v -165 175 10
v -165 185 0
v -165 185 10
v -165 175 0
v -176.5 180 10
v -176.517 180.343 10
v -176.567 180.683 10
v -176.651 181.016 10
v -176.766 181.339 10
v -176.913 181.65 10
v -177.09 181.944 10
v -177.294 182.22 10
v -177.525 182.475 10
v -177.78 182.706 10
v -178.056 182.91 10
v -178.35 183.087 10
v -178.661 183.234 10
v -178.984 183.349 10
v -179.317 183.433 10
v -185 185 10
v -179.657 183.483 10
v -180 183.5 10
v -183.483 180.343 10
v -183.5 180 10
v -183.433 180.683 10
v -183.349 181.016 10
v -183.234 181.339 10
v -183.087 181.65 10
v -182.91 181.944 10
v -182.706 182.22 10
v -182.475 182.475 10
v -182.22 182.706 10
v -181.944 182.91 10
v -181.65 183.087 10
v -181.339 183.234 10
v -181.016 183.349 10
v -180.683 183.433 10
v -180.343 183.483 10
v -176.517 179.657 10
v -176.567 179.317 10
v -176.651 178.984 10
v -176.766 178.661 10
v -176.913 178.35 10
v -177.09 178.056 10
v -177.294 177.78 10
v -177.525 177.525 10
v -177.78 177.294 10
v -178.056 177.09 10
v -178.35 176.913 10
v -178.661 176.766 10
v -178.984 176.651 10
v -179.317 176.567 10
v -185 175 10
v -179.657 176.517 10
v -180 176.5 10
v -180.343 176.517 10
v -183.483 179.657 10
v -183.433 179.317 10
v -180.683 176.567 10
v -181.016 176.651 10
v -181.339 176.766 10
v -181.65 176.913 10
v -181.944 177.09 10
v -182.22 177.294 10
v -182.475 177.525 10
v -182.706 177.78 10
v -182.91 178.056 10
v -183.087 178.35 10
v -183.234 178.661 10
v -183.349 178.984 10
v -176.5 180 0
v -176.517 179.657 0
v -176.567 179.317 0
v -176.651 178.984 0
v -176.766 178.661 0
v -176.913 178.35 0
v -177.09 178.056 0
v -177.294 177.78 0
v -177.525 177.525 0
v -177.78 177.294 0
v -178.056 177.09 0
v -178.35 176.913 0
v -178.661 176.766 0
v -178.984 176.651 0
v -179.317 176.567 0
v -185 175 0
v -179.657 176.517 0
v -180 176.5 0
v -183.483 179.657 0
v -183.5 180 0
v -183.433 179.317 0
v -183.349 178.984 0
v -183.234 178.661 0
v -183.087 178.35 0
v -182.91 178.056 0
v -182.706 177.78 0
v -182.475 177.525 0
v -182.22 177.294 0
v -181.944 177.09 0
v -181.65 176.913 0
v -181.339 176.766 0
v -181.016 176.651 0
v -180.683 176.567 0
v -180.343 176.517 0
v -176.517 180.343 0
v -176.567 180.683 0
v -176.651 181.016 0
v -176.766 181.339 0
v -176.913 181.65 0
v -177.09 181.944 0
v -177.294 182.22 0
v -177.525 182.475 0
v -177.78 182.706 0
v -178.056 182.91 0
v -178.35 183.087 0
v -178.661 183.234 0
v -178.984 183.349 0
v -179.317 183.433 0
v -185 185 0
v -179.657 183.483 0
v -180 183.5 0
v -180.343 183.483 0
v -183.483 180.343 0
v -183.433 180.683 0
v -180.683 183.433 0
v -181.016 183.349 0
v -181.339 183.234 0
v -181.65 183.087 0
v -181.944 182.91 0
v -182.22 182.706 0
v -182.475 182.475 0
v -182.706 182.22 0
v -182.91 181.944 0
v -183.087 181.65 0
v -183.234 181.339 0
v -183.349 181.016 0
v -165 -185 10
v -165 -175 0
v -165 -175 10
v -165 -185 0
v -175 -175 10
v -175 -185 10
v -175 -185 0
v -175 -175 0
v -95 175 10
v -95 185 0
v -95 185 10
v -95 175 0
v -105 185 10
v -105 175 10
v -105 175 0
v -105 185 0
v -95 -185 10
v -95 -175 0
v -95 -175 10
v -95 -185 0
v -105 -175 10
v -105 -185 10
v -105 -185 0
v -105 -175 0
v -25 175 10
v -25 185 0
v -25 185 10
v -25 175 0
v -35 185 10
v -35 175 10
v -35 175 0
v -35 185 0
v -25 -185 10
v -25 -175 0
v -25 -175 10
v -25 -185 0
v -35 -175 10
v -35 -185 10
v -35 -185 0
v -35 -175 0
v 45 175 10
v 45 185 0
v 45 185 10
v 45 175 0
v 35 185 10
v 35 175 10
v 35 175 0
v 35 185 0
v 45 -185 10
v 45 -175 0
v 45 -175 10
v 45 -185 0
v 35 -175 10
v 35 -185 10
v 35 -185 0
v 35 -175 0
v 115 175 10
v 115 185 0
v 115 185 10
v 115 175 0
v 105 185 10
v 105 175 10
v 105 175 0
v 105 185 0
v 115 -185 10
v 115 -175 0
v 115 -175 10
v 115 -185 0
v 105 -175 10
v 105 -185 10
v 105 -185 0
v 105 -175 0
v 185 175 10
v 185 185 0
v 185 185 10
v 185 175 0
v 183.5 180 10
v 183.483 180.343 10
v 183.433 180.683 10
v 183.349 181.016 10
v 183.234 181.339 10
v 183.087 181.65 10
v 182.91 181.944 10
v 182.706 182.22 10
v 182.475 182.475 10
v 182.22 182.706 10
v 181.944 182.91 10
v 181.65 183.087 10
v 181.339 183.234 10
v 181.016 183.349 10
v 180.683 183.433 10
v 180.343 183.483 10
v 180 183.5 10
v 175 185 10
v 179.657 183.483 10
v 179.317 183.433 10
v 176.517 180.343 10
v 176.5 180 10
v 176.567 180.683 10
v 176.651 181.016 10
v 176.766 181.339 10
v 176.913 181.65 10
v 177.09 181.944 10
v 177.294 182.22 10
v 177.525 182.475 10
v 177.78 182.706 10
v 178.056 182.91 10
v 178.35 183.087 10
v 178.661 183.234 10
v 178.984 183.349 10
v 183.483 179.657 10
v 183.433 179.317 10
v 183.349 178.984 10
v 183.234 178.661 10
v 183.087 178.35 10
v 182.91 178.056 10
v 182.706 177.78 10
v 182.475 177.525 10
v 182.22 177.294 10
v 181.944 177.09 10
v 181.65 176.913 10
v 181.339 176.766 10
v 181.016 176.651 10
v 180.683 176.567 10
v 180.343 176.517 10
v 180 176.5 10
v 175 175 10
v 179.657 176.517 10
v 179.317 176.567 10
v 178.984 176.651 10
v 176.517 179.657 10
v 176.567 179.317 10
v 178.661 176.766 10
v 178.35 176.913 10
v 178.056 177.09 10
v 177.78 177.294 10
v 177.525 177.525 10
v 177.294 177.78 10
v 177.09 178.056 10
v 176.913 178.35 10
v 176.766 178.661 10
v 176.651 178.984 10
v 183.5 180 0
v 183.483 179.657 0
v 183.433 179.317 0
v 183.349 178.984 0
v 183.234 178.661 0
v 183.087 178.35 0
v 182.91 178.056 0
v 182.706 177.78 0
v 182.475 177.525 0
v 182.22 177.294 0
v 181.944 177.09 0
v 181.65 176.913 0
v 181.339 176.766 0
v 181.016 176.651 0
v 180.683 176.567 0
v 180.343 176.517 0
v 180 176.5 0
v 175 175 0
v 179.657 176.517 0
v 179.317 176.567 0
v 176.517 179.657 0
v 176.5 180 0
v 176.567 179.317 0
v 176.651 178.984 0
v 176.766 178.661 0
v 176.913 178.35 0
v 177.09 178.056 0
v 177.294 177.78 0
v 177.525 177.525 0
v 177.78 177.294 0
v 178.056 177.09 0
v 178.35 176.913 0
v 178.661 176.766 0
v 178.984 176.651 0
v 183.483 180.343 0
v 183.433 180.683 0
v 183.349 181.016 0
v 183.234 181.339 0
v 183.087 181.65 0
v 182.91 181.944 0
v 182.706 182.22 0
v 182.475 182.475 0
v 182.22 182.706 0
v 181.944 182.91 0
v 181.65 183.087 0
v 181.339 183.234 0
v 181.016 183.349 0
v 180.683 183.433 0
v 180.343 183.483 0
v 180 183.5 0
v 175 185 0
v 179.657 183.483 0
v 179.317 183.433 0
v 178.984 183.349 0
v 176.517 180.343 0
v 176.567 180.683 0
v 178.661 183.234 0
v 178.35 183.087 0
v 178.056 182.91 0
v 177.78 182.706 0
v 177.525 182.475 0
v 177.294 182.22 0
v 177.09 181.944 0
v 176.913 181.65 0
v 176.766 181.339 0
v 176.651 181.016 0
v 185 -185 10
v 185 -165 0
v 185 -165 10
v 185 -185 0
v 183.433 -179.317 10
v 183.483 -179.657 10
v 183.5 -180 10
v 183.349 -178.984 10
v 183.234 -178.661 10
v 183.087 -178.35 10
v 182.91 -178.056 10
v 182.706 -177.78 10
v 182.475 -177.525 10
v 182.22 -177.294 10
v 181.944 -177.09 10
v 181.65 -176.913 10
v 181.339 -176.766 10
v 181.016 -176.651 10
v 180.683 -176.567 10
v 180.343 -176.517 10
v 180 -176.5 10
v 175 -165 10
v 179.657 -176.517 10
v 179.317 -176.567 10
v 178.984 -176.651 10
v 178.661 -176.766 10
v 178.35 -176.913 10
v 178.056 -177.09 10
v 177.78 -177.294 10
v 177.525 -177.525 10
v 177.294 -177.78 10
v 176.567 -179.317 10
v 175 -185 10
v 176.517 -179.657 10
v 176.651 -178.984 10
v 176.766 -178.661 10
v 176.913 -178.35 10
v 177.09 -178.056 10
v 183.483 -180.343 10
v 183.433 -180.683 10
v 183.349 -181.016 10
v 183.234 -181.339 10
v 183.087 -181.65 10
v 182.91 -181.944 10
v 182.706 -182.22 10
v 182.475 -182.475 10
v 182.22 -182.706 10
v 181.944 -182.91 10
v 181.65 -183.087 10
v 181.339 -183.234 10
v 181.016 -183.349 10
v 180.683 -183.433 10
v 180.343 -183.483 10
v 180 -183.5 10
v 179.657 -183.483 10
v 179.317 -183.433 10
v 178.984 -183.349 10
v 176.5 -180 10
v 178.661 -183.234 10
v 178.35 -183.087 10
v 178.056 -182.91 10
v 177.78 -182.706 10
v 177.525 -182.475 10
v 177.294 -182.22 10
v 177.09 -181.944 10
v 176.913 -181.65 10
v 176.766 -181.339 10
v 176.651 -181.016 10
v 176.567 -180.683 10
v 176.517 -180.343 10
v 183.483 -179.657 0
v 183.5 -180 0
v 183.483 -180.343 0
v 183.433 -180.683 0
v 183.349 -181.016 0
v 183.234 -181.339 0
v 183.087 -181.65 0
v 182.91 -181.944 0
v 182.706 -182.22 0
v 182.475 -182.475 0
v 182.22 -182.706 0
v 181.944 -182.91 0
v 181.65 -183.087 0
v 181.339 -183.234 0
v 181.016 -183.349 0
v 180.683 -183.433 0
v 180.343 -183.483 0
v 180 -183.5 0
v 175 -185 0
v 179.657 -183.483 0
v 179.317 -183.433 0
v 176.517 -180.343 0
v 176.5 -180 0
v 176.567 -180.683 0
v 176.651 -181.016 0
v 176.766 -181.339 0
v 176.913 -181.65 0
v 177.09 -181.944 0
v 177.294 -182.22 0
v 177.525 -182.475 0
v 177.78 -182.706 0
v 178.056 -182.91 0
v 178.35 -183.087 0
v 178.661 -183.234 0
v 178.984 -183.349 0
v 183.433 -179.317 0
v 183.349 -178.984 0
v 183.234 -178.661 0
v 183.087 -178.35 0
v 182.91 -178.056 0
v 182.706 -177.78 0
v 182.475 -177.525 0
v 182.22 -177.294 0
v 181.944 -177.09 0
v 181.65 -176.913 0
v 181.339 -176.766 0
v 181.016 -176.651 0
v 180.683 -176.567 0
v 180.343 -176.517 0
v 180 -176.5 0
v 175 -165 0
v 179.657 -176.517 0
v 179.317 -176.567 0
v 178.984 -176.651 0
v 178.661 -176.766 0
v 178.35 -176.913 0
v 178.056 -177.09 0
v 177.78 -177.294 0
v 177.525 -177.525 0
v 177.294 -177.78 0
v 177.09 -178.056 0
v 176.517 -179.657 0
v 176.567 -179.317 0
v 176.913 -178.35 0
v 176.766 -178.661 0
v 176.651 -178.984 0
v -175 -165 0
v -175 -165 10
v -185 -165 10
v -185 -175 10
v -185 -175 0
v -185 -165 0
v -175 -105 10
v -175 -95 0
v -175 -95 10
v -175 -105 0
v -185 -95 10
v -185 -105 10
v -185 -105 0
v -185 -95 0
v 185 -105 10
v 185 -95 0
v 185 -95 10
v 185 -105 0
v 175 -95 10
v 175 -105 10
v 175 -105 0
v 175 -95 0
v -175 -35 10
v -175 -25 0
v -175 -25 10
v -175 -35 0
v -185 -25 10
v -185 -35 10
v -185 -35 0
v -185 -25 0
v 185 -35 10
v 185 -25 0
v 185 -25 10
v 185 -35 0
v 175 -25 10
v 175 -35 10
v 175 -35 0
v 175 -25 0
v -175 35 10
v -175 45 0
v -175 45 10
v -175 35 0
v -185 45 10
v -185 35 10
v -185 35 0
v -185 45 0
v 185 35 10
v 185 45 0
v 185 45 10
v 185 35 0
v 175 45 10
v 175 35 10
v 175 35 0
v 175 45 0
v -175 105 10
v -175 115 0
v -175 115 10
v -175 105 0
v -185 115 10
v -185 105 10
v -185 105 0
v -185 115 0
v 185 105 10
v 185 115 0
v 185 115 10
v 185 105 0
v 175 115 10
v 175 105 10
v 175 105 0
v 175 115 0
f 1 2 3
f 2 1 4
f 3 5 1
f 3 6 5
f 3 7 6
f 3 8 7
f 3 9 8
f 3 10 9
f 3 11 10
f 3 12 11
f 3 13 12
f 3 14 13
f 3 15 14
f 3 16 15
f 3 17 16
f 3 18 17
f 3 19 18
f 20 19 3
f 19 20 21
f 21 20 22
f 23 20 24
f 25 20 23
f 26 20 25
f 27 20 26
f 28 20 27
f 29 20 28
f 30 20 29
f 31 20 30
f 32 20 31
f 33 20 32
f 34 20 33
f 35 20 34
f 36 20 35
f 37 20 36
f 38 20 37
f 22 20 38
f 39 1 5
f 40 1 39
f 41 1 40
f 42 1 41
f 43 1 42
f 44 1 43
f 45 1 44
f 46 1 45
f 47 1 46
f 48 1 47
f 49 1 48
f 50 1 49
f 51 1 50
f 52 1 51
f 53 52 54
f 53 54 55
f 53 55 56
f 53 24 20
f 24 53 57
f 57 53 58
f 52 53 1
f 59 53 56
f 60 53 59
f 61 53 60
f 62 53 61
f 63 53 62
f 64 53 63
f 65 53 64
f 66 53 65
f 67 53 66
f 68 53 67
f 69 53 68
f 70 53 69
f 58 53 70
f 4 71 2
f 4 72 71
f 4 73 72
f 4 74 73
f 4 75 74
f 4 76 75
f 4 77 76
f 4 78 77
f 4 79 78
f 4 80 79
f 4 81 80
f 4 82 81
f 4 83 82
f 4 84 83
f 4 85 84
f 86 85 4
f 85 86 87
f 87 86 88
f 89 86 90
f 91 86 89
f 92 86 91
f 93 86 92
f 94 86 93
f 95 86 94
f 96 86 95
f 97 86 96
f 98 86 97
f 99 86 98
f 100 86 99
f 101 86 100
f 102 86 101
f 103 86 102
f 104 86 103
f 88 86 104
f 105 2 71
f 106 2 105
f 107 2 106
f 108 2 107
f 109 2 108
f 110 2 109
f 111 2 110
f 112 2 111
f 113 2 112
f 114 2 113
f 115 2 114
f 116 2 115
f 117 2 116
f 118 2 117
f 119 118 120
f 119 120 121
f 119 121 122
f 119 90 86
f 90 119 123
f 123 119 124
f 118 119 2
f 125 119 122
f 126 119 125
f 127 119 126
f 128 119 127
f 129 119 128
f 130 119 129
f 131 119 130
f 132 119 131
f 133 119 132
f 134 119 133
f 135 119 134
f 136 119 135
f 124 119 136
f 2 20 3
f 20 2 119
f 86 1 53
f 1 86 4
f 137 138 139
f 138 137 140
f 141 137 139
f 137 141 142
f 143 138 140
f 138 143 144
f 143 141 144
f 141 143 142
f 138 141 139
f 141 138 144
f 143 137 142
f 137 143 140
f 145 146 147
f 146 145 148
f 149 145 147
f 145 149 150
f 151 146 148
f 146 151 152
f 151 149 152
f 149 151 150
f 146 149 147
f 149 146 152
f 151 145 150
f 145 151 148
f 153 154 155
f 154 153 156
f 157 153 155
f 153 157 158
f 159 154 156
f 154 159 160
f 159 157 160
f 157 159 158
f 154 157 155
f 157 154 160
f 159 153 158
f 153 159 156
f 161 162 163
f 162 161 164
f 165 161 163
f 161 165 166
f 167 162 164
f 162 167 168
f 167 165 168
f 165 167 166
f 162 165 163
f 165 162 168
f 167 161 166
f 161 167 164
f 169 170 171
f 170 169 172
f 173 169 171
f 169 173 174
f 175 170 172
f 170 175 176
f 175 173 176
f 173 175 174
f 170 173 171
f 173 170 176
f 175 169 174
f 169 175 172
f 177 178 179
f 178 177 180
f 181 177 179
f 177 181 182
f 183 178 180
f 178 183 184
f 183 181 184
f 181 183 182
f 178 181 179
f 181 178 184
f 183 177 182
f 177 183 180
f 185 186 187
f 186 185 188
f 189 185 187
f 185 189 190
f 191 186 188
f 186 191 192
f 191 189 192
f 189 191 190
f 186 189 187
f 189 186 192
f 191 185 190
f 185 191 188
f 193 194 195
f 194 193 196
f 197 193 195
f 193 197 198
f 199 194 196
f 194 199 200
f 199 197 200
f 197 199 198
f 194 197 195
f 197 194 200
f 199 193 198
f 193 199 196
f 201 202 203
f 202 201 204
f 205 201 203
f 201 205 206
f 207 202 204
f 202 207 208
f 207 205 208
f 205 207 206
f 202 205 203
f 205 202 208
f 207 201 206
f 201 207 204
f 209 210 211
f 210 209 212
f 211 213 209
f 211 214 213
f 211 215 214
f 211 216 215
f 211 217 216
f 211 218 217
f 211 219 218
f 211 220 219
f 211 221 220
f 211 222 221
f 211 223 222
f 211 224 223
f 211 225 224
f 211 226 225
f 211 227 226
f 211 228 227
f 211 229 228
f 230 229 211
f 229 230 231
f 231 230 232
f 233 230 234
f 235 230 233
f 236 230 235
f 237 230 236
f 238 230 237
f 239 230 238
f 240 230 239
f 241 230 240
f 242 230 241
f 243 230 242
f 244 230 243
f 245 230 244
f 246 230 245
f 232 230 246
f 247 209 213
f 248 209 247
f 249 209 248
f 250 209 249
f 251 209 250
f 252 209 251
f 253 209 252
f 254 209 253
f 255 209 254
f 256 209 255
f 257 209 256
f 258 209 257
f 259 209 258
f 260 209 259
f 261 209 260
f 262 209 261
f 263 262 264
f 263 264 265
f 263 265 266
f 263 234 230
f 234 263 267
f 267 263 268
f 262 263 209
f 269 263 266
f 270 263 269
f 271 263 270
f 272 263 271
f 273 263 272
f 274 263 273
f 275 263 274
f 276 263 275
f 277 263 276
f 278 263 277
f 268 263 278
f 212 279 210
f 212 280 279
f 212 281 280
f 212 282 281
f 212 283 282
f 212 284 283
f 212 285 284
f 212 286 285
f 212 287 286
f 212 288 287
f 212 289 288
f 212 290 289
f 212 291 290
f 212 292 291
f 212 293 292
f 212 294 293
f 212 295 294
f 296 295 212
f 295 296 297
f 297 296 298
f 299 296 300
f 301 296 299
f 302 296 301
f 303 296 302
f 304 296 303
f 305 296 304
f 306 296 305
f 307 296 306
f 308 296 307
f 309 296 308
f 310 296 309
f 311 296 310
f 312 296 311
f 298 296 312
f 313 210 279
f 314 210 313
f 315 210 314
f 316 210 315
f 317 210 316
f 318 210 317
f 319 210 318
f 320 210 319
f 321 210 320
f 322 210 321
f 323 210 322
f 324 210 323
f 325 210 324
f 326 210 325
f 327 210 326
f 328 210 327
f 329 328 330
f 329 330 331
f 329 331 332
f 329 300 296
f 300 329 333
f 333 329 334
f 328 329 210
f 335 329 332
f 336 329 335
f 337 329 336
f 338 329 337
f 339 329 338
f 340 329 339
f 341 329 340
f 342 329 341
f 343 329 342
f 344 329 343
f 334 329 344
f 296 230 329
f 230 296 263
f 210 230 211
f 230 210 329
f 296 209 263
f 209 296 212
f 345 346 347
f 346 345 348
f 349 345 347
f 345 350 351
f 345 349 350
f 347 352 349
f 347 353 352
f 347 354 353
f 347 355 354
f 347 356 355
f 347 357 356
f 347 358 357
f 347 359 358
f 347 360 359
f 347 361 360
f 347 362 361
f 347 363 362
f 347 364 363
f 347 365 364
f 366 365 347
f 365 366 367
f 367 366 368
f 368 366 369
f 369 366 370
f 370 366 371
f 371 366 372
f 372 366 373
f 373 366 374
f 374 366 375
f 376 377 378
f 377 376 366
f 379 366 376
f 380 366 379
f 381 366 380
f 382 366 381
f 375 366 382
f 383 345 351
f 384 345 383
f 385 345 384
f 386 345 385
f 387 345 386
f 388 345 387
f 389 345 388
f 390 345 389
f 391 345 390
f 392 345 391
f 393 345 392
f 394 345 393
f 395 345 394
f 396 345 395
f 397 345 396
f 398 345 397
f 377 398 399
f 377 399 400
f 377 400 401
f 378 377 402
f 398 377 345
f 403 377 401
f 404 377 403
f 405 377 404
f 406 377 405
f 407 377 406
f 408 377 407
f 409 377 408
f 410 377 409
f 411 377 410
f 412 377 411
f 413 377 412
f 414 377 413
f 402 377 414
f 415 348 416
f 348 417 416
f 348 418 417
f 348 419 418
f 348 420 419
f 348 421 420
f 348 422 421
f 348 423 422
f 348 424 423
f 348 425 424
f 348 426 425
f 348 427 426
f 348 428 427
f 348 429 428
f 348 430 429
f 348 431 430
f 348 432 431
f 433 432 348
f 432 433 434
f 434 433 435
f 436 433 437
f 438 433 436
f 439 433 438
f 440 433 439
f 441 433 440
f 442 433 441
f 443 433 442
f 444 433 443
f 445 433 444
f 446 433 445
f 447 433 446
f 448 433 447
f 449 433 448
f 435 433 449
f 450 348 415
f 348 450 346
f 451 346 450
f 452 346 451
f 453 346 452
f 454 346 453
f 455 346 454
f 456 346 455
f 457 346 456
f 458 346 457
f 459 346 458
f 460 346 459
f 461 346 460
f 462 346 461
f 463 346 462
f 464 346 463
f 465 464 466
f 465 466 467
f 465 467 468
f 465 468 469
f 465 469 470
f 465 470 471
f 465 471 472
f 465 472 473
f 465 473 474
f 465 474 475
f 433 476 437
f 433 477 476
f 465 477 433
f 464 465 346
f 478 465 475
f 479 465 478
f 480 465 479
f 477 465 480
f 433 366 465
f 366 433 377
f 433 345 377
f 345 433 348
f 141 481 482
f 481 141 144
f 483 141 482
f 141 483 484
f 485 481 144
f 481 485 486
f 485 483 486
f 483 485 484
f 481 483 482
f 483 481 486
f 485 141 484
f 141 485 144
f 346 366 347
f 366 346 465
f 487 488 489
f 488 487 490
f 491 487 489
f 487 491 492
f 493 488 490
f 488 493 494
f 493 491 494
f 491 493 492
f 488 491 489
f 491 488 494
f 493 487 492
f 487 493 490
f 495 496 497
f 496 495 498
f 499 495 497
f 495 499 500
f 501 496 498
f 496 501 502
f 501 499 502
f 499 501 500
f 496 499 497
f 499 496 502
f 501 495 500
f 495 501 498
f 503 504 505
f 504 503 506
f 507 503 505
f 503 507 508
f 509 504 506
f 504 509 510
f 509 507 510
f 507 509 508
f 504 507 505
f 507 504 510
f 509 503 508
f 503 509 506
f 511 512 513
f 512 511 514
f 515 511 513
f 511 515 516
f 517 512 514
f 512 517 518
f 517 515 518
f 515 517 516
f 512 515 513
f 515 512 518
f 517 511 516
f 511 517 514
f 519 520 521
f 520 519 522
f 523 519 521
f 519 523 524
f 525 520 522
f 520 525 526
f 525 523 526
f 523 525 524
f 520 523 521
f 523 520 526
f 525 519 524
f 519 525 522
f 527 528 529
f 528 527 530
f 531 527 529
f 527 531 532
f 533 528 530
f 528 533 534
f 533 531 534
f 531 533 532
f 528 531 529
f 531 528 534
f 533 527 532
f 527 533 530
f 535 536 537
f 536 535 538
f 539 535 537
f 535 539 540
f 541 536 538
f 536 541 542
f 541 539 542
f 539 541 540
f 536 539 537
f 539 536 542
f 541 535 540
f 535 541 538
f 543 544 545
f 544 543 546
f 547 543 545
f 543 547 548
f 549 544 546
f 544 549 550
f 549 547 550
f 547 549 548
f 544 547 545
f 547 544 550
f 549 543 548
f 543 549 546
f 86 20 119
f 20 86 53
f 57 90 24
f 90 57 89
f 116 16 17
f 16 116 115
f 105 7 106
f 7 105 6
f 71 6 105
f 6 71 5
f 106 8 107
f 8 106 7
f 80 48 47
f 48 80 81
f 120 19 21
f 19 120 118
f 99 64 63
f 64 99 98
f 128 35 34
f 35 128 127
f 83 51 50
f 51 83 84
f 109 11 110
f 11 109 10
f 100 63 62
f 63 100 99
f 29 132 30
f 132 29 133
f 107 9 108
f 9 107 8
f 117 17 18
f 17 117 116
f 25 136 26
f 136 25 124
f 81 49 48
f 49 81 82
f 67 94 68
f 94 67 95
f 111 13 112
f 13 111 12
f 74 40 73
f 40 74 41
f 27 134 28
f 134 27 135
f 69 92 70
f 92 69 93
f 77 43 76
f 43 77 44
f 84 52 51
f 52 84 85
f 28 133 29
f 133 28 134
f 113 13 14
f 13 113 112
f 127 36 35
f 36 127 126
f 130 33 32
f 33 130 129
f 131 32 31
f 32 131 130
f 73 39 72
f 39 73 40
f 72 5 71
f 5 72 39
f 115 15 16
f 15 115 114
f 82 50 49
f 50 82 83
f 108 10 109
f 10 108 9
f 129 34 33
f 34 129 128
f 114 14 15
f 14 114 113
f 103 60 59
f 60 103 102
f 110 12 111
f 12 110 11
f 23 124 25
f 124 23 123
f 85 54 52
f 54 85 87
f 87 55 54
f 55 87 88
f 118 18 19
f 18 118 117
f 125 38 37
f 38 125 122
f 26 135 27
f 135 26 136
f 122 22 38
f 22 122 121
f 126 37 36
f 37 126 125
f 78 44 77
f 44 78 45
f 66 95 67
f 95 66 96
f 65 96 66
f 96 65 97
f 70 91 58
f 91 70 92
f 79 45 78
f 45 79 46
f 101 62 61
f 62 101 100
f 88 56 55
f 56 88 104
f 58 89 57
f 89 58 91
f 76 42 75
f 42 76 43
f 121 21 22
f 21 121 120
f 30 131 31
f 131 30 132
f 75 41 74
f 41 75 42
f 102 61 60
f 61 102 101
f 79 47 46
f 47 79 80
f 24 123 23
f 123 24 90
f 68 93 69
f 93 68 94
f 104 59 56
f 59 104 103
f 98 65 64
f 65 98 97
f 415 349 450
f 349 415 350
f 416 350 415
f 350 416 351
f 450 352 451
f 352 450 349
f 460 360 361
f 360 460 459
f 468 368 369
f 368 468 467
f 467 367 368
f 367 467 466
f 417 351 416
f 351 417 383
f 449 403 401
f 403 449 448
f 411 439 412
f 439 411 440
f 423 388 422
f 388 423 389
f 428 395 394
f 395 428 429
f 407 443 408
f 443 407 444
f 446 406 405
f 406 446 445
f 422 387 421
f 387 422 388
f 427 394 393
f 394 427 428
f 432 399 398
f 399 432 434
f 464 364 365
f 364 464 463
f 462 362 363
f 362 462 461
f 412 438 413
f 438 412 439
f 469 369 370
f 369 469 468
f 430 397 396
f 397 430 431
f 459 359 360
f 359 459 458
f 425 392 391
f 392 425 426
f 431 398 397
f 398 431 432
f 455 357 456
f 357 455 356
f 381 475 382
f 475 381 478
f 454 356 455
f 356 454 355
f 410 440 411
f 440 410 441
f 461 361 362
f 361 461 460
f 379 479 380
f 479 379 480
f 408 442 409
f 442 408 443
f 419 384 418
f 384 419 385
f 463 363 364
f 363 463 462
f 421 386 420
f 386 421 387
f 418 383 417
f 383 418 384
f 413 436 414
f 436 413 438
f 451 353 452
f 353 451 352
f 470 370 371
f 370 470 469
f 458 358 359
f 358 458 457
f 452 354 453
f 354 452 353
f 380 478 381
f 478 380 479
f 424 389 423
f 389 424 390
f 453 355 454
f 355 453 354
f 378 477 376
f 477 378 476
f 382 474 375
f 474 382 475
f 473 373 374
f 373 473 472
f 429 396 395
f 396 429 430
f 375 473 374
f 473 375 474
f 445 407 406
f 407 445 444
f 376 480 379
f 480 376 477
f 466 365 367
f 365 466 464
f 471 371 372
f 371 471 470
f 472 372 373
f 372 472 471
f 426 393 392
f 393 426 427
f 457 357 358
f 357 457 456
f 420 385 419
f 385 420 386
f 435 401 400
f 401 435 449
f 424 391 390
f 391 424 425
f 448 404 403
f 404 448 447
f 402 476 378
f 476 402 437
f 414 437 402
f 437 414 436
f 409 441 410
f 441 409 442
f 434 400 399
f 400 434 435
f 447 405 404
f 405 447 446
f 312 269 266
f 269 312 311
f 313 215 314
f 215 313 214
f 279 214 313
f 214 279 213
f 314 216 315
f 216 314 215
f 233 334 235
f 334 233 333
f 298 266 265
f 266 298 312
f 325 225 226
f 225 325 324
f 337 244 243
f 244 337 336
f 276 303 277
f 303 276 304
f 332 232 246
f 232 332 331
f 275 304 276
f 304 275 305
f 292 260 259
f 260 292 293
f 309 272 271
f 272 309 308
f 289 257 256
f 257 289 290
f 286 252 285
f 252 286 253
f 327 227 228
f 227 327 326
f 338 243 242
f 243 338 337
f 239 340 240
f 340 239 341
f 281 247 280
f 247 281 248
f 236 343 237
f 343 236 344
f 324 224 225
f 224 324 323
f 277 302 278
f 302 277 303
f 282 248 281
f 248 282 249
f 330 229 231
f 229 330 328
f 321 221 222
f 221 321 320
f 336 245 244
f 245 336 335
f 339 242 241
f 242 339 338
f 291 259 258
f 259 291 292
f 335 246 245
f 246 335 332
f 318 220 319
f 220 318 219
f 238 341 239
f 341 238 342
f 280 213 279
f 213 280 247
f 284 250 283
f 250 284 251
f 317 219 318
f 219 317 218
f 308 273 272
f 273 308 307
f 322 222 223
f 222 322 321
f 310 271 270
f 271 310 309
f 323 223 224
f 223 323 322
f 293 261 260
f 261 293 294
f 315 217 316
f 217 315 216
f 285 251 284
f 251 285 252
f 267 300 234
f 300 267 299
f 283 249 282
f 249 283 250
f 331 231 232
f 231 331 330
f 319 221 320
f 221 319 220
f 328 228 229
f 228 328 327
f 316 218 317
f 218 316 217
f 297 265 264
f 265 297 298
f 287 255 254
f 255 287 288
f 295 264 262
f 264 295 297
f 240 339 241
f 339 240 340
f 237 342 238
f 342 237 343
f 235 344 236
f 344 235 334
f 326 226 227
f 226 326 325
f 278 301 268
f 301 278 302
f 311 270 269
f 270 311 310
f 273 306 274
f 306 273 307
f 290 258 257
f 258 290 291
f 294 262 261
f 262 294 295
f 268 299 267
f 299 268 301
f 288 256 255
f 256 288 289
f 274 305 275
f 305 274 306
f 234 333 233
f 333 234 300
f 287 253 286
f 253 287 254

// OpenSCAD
// ring_67.scad - ring index 67 (z bottom = 670 mm)
$fn = 64; bar = 10; half_b = bar/2; outer = 370; half_outer = outer/2;
front_y = 180; back_y = -180; left_x = -180; right_x = 180;
x_centers = [-170, -100, -30, 40, 110, 180];
z_centers = [5, 85, 155, 225, 295, 365, 435, 505, 575, 645, 715]; ring_z = 670;
module place_box(cx, cy, sx, sy) { translate([cx - sx/2, cy - sy/2, 0]) cube([sx, sy, bar]); }

difference() { union() {
    for (x = x_centers) { place_box(x, front_y, bar, bar); place_box(x, back_y, bar, bar); }
    for (y = x_centers) { place_box(left_x, y, bar, bar); place_box(right_x, y, bar, bar); }
    for (zc = z_centers) if ((zc - half_b < ring_z + bar) && (zc + half_b > ring_z)) {
        translate([-half_outer, front_y - half_b, 0]) cube([outer, bar, bar]);
        translate([-half_outer, back_y - half_b, 0])  cube([outer, bar, bar]);
        translate([left_x - half_b, -half_outer, 0])  cube([bar, outer, bar]);
        translate([right_x - half_b, -half_outer, 0]) cube([bar, outer, bar]);
    }
  }
  for (cx = [-180, 180]) for (cy = [-180, 180]) translate([cx, cy, 0]) cylinder(h = bar, r = 3.5, $fn = 64);
}
